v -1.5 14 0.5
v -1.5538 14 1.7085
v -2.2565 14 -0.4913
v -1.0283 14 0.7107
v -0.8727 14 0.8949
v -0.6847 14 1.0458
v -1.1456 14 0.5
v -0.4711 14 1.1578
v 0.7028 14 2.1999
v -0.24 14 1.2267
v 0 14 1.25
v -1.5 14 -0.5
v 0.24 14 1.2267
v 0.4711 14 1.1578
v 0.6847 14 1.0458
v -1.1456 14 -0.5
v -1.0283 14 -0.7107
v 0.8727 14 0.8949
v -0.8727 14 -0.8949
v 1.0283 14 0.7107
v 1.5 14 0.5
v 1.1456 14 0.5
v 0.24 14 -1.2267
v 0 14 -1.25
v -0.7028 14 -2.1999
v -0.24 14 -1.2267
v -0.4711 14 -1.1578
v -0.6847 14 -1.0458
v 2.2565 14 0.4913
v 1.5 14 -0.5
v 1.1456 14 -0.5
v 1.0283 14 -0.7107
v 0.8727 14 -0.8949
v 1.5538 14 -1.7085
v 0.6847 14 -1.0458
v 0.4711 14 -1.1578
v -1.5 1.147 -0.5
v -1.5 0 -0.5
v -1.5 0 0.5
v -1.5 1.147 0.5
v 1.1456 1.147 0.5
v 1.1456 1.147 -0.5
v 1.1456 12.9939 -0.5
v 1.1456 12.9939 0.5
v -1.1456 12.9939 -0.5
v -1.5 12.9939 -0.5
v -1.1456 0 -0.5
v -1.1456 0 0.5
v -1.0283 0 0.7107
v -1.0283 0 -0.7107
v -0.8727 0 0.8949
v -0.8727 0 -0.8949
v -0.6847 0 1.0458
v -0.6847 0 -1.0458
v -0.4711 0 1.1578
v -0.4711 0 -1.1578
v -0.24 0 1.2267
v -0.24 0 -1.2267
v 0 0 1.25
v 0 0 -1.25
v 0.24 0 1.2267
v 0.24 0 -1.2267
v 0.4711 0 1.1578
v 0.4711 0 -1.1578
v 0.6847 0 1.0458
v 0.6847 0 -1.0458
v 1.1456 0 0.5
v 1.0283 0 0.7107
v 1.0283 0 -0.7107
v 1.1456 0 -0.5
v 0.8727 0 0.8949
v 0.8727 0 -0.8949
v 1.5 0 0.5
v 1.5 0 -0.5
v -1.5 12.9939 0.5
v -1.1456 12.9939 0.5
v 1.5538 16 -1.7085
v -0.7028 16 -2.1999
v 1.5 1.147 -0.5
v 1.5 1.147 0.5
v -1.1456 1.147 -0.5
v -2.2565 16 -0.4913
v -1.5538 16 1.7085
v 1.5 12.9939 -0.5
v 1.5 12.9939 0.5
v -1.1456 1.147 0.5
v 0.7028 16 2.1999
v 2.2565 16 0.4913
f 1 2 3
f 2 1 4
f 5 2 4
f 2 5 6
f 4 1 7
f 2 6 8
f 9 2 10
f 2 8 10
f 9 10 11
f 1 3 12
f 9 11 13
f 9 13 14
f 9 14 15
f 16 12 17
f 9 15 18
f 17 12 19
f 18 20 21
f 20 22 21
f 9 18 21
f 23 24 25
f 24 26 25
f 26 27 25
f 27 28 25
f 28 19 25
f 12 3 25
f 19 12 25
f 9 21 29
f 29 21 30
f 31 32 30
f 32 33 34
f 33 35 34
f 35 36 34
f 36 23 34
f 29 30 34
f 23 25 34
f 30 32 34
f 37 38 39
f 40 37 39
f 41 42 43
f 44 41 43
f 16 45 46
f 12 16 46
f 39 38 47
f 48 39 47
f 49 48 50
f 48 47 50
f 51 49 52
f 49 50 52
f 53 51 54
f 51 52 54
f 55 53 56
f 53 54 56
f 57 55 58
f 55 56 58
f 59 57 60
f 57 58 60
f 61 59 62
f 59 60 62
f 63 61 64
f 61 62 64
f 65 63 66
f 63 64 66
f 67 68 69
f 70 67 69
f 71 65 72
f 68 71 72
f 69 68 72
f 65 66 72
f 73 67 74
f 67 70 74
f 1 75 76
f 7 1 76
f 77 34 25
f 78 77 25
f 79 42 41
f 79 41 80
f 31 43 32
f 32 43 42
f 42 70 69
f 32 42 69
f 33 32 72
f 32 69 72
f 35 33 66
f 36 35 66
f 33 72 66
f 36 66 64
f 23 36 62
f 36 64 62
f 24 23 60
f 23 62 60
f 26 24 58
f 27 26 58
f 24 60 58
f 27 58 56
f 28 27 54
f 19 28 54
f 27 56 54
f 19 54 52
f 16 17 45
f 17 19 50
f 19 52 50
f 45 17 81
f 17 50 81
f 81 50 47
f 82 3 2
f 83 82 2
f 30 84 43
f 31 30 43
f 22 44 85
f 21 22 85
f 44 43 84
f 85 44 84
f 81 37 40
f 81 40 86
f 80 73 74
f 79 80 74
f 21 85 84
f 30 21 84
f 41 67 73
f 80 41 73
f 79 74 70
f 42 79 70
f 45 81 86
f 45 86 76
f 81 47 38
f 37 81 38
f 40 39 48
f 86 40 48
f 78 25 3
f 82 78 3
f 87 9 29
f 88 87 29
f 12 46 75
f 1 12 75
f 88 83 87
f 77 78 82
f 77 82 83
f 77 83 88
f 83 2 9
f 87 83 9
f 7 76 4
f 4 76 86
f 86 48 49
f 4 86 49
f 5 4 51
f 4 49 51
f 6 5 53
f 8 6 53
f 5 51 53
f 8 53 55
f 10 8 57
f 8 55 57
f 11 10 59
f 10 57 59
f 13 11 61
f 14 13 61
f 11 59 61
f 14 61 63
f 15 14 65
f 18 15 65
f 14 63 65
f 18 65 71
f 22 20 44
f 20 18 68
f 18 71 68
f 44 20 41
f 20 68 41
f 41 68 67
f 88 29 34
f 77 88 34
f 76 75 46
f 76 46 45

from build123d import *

# Parameters (mm, degrees)
BOSS_EXTRUDE1_DEPTH     = 14
BOSS_EXTRUDE2_DEPTH     = 2
SKETCH3_W               = 0.354356076
SKETCH3_H               = 11.846889002
CUT_EXTRUDE1_DEPTH      = 3.199876682
CUT_EXTRUDE1_DEPTH_BACK = 3.199876682


with BuildPart() as part:
    # Sketch1 → Boss-Extrude1 (new body)
    with BuildSketch(Plane(origin=(0, 0, 0), x_dir=(1, 0, 0), z_dir=(0, 1, 0))):
        with BuildLine():
            Line((-1.145643924, 0.5), (-1.5, 0.5))
            Line((-1.5, 0.5), (-1.5, -0.5))
            Line((-1.5, -0.5), (-1.145643924, -0.5))
            ThreePointArc((-1.145643924, -0.5), (0, -1.25), (1.145643924, -0.5))
            Line((1.145643924, -0.5), (1.5, -0.5))
            Line((1.5, -0.5), (1.5, 0.5))
            Line((1.5, 0.5), (1.145643924, 0.5))
            ThreePointArc((1.145643924, 0.5), (0, 1.25), (-1.145643924, 0.5))
        make_face()
    extrude(amount=BOSS_EXTRUDE1_DEPTH)

    # Sketch2 → Boss-Extrude2 (add)
    with BuildSketch(Plane(origin=(0, 14, 0), x_dir=(1, 0, 0), z_dir=(0, 1, 0))):
        Polygon((-1.553767561, -1.708549004), (0.702763061, -2.199876682), (2.256530622, -0.491327678), (1.553767561, 1.708549004), (-0.702763061, 2.199876682), (-2.256530622, 0.491327678), align=None)
    extrude(amount=BOSS_EXTRUDE2_DEPTH)

    # Sketch3 → Cut-Extrude1 (cut, two sides)
    with BuildSketch(Plane.XY) as cut_extrude1_sk:
        with Locations((1.322821962, 7.070449387)):
            Rectangle(SKETCH3_W, SKETCH3_H)
        with Locations((-1.322821962, 7.070449387)):
            Rectangle(SKETCH3_W, SKETCH3_H)
    extrude(amount=CUT_EXTRUDE1_DEPTH, mode=Mode.SUBTRACT)
    extrude(cut_extrude1_sk.sketch, amount=-CUT_EXTRUDE1_DEPTH_BACK, mode=Mode.SUBTRACT)


solid = part.part
